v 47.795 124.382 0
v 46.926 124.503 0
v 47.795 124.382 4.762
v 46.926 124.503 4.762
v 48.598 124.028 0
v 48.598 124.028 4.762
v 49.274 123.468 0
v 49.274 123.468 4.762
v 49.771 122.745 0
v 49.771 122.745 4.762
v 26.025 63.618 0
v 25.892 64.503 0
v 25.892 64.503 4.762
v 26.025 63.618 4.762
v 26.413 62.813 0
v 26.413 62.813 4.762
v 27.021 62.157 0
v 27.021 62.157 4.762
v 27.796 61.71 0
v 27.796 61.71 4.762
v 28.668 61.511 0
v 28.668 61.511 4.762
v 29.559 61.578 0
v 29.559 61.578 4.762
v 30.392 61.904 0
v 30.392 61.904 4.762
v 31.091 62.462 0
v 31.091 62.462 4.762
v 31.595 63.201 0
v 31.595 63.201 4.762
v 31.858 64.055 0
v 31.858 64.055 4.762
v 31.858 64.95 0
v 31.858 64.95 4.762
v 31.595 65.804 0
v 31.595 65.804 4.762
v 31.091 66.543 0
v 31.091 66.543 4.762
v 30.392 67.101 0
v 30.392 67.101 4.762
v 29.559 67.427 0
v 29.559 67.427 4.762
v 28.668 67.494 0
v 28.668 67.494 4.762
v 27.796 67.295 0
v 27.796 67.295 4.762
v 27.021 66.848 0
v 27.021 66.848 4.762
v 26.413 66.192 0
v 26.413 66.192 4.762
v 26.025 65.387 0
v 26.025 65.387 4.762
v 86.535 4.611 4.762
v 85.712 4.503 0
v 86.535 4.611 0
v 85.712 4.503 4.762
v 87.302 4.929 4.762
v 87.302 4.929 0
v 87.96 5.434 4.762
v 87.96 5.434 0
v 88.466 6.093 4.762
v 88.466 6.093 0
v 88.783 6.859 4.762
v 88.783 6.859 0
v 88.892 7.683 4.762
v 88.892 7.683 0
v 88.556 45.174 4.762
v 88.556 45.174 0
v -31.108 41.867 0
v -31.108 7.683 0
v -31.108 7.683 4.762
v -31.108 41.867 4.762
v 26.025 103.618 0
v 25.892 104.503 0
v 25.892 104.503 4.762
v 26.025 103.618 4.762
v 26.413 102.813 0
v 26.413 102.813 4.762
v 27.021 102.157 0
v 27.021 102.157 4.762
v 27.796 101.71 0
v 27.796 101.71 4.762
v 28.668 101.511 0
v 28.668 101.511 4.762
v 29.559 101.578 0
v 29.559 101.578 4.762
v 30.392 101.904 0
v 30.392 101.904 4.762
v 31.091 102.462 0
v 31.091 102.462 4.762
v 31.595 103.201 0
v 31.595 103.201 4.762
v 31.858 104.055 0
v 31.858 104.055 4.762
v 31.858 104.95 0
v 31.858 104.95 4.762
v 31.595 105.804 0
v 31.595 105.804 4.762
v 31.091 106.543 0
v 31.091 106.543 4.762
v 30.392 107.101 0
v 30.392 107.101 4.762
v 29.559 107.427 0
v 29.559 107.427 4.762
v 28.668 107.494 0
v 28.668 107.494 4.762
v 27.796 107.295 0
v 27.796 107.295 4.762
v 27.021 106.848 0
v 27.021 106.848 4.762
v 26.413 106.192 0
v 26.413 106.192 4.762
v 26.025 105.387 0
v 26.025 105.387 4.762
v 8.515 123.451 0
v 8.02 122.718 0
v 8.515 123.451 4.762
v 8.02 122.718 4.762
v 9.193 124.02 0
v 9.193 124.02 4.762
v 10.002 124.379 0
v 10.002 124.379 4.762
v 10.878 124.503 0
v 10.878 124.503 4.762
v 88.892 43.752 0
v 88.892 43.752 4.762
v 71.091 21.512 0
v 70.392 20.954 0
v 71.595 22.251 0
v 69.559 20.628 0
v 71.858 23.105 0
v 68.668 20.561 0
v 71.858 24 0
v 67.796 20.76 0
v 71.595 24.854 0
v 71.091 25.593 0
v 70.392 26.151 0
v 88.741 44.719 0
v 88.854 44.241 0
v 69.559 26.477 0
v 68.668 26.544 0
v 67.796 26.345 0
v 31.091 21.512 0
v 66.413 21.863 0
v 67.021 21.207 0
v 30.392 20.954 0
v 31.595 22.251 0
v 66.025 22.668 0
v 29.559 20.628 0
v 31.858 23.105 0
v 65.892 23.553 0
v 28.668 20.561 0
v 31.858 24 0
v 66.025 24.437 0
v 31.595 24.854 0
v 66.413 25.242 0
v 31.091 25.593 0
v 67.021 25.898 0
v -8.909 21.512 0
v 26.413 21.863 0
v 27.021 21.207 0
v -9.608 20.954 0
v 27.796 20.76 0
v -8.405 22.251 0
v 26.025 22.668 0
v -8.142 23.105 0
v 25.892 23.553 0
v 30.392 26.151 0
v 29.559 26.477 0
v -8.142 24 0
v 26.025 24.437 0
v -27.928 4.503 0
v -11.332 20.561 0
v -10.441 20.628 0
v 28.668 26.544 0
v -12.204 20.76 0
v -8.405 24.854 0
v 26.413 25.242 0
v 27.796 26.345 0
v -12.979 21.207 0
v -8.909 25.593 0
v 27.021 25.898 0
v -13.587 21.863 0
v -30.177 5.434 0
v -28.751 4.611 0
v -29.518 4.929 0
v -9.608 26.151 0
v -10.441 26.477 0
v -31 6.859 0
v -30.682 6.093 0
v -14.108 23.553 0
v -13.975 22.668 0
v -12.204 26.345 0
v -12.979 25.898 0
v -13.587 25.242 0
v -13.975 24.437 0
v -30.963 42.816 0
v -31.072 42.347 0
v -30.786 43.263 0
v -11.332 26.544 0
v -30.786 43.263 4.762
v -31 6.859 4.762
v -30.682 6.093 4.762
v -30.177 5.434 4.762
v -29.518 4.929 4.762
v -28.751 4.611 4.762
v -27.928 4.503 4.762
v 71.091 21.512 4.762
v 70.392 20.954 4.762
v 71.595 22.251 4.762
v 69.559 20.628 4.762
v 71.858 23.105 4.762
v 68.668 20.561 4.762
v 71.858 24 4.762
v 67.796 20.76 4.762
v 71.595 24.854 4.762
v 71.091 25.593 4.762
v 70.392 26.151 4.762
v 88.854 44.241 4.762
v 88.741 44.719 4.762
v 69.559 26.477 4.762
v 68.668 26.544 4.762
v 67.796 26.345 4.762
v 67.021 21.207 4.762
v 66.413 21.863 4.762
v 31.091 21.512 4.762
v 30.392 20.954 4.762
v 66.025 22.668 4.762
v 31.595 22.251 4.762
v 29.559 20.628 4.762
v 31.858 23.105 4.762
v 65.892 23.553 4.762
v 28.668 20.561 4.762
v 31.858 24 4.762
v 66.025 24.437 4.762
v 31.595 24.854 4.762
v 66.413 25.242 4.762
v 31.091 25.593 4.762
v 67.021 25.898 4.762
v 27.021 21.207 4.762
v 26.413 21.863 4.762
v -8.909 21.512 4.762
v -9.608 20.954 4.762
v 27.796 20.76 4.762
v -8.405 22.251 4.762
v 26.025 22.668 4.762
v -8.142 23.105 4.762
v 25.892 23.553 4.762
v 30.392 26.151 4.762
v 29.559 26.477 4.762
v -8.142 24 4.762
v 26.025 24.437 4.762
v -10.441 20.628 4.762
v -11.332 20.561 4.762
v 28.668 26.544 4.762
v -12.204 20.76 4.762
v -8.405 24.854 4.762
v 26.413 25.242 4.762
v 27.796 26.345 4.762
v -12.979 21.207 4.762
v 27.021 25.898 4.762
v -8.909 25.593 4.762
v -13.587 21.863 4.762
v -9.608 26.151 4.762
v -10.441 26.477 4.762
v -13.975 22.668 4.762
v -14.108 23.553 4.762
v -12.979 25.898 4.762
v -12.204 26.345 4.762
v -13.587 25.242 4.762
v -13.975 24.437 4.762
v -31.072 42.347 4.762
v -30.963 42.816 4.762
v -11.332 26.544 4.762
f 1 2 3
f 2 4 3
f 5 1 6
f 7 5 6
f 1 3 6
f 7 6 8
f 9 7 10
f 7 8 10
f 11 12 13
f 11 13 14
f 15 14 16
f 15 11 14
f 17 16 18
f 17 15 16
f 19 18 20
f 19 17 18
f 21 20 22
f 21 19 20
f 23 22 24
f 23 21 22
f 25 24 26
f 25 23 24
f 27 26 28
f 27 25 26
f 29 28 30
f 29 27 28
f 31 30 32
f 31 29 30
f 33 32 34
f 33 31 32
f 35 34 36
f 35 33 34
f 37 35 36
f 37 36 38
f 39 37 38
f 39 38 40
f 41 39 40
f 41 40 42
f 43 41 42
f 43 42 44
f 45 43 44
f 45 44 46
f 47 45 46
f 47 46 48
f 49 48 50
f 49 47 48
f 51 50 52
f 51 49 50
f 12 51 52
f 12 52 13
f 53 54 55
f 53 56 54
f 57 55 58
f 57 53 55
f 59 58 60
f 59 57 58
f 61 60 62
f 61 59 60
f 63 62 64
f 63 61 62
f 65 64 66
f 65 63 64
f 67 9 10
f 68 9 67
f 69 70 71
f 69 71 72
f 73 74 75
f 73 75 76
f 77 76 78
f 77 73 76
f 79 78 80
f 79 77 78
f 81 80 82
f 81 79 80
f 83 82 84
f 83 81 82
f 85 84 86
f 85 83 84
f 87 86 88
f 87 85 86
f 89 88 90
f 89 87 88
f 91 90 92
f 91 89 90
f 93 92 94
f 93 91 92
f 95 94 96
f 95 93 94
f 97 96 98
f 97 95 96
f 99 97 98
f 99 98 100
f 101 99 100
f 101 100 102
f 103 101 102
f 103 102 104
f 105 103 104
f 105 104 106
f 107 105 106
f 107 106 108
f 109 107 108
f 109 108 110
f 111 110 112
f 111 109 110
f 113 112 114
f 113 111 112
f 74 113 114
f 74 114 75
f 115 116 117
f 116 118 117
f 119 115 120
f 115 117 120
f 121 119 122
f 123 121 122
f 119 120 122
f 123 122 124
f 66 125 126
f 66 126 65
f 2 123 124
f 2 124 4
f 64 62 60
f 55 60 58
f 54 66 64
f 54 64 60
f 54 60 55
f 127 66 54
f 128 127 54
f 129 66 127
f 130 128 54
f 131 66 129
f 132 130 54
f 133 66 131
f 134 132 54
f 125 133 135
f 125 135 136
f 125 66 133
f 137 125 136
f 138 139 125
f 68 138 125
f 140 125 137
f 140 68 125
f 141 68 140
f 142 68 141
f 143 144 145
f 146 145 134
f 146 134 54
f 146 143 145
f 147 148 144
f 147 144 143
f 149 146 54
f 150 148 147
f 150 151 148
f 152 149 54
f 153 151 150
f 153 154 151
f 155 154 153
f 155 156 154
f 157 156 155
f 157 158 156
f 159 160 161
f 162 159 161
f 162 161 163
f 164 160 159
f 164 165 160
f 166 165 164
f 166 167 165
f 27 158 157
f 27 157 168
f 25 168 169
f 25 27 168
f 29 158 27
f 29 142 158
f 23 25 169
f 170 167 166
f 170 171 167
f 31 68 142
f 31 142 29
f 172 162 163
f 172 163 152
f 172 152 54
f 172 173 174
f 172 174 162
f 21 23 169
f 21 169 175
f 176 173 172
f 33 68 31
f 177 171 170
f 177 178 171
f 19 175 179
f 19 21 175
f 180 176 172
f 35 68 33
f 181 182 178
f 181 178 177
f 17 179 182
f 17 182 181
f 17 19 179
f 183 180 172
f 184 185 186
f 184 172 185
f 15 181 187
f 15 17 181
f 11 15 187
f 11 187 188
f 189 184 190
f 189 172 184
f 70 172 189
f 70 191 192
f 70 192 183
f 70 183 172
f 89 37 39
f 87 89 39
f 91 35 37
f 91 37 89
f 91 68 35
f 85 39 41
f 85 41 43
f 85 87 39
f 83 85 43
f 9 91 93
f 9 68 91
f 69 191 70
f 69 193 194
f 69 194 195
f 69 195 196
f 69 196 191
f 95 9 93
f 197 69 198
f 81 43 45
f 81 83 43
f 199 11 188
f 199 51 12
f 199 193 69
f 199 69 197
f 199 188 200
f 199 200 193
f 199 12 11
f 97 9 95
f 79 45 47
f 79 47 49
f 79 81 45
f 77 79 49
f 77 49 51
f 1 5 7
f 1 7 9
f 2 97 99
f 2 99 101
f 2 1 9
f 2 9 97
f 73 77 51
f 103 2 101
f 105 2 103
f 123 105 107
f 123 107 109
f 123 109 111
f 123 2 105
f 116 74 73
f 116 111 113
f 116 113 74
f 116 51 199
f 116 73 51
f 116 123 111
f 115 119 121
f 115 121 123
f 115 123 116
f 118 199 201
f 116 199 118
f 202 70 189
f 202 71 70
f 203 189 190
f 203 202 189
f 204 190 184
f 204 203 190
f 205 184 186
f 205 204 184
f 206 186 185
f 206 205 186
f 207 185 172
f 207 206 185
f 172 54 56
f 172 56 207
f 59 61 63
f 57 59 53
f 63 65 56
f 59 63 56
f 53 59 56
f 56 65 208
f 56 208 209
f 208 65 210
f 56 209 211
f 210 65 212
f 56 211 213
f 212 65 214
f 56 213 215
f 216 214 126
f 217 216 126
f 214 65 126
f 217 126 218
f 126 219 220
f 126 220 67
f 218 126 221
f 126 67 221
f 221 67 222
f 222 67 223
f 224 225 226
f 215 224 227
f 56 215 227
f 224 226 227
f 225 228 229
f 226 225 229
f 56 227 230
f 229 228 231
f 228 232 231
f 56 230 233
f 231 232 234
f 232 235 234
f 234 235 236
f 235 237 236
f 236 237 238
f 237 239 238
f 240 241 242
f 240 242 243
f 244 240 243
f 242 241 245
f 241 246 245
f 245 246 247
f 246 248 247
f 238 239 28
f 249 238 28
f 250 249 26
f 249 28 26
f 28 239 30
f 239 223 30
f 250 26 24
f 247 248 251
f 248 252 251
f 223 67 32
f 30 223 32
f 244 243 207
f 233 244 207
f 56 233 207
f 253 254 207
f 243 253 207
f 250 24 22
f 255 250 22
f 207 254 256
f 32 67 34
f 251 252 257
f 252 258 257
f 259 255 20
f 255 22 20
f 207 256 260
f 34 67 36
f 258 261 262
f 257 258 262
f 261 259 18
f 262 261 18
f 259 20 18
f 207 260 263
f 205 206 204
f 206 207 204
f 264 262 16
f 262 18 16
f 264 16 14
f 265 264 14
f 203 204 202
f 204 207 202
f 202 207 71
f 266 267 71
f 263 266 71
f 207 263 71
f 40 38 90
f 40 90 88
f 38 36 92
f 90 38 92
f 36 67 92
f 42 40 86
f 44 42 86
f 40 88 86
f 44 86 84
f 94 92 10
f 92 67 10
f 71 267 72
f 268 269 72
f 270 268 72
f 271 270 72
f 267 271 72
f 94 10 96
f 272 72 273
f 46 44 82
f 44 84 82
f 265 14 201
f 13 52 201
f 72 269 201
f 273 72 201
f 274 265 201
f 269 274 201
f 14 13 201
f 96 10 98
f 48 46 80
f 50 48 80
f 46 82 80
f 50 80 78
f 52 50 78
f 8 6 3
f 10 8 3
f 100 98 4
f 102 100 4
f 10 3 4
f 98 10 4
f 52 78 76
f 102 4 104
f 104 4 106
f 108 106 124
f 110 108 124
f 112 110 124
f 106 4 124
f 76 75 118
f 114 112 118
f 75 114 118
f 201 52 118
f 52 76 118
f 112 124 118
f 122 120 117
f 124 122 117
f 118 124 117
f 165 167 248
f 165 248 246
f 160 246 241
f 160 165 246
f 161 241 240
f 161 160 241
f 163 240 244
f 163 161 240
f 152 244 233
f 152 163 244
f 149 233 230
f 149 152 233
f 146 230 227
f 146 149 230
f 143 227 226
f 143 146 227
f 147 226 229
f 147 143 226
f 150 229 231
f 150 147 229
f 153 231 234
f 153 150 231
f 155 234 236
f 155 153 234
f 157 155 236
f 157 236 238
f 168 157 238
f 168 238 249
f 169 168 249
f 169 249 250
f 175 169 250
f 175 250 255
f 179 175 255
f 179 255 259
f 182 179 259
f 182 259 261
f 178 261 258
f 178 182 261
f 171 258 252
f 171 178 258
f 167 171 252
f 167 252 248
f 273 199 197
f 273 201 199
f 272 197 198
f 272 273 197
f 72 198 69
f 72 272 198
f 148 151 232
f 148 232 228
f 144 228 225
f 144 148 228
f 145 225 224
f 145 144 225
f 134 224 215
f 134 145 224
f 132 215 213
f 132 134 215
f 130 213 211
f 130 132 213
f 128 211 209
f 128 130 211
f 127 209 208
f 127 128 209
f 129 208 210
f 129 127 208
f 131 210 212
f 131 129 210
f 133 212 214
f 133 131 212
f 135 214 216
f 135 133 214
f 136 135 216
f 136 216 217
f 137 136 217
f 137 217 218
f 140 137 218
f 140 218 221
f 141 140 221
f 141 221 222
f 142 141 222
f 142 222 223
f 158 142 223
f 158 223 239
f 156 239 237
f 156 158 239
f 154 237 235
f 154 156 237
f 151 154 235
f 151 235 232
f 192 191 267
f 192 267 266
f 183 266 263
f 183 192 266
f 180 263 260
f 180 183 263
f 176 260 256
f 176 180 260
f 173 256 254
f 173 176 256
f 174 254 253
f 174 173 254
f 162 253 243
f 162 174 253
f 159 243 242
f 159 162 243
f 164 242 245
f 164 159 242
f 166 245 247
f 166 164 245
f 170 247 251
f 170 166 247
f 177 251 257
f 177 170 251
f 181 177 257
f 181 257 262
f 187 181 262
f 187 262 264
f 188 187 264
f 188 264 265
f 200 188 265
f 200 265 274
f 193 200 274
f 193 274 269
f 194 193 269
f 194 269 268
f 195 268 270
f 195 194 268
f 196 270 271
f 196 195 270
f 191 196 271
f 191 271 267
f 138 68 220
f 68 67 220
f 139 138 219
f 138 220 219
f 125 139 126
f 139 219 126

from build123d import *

# Parameters (mm, degrees)
SKETCH2_R           = 3
BOSS_EXTRUDE1_DEPTH = 4.7625
FILLET1_R           = 3.18


with BuildPart() as part:
    # Sketch2 → Boss-Extrude1 (new body)
    with BuildSketch(Plane.XY):
        Polygon((-31.10816412, 42.602538855), (8.89183588, 124.502538855), (48.89183588, 124.502538855), (88.89183588, 44.502538855), (88.89183588, 4.502538855), (-31.10816412, 4.502538855), align=None)
        with Locations(Location((28.89183588, 104.502538855, 0), (0, 0, 180))):
            Circle(SKETCH2_R, mode=Mode.SUBTRACT)
        with Locations(Location((28.89183588, 64.502538855, 0), (0, 0, 180))):
            Circle(SKETCH2_R, mode=Mode.SUBTRACT)
        with Locations(Location((-11.10816412, 23.552538855, 0), (0, 0, 180))):
            Circle(SKETCH2_R, mode=Mode.SUBTRACT)
        with Locations(Location((68.89183588, 23.552538855, 0), (0, 0, 180))):
            Circle(SKETCH2_R, mode=Mode.SUBTRACT)
        with Locations(Location((28.89183588, 23.552538855, 0), (0, 0, 180))):
            Circle(SKETCH2_R, mode=Mode.SUBTRACT)
    extrude(amount=BOSS_EXTRUDE1_DEPTH)

    # Fillet1
    fillet1_edges = [part.edges().sort_by_distance(p)[0] for p in [
        (-31.10816412, 42.602538855, 2.38125),
        (8.89183588, 124.502538855, 2.38125),
        (48.89183588, 124.502538855, 2.38125),
        (88.89183588, 44.502538855, 2.38125),
        (88.89183588, 4.502538855, 2.38125),
        (-31.10816412, 4.502538855, 2.38125),
    ]]
    fillet(fillet1_edges, radius=FILLET1_R)


solid = part.part
